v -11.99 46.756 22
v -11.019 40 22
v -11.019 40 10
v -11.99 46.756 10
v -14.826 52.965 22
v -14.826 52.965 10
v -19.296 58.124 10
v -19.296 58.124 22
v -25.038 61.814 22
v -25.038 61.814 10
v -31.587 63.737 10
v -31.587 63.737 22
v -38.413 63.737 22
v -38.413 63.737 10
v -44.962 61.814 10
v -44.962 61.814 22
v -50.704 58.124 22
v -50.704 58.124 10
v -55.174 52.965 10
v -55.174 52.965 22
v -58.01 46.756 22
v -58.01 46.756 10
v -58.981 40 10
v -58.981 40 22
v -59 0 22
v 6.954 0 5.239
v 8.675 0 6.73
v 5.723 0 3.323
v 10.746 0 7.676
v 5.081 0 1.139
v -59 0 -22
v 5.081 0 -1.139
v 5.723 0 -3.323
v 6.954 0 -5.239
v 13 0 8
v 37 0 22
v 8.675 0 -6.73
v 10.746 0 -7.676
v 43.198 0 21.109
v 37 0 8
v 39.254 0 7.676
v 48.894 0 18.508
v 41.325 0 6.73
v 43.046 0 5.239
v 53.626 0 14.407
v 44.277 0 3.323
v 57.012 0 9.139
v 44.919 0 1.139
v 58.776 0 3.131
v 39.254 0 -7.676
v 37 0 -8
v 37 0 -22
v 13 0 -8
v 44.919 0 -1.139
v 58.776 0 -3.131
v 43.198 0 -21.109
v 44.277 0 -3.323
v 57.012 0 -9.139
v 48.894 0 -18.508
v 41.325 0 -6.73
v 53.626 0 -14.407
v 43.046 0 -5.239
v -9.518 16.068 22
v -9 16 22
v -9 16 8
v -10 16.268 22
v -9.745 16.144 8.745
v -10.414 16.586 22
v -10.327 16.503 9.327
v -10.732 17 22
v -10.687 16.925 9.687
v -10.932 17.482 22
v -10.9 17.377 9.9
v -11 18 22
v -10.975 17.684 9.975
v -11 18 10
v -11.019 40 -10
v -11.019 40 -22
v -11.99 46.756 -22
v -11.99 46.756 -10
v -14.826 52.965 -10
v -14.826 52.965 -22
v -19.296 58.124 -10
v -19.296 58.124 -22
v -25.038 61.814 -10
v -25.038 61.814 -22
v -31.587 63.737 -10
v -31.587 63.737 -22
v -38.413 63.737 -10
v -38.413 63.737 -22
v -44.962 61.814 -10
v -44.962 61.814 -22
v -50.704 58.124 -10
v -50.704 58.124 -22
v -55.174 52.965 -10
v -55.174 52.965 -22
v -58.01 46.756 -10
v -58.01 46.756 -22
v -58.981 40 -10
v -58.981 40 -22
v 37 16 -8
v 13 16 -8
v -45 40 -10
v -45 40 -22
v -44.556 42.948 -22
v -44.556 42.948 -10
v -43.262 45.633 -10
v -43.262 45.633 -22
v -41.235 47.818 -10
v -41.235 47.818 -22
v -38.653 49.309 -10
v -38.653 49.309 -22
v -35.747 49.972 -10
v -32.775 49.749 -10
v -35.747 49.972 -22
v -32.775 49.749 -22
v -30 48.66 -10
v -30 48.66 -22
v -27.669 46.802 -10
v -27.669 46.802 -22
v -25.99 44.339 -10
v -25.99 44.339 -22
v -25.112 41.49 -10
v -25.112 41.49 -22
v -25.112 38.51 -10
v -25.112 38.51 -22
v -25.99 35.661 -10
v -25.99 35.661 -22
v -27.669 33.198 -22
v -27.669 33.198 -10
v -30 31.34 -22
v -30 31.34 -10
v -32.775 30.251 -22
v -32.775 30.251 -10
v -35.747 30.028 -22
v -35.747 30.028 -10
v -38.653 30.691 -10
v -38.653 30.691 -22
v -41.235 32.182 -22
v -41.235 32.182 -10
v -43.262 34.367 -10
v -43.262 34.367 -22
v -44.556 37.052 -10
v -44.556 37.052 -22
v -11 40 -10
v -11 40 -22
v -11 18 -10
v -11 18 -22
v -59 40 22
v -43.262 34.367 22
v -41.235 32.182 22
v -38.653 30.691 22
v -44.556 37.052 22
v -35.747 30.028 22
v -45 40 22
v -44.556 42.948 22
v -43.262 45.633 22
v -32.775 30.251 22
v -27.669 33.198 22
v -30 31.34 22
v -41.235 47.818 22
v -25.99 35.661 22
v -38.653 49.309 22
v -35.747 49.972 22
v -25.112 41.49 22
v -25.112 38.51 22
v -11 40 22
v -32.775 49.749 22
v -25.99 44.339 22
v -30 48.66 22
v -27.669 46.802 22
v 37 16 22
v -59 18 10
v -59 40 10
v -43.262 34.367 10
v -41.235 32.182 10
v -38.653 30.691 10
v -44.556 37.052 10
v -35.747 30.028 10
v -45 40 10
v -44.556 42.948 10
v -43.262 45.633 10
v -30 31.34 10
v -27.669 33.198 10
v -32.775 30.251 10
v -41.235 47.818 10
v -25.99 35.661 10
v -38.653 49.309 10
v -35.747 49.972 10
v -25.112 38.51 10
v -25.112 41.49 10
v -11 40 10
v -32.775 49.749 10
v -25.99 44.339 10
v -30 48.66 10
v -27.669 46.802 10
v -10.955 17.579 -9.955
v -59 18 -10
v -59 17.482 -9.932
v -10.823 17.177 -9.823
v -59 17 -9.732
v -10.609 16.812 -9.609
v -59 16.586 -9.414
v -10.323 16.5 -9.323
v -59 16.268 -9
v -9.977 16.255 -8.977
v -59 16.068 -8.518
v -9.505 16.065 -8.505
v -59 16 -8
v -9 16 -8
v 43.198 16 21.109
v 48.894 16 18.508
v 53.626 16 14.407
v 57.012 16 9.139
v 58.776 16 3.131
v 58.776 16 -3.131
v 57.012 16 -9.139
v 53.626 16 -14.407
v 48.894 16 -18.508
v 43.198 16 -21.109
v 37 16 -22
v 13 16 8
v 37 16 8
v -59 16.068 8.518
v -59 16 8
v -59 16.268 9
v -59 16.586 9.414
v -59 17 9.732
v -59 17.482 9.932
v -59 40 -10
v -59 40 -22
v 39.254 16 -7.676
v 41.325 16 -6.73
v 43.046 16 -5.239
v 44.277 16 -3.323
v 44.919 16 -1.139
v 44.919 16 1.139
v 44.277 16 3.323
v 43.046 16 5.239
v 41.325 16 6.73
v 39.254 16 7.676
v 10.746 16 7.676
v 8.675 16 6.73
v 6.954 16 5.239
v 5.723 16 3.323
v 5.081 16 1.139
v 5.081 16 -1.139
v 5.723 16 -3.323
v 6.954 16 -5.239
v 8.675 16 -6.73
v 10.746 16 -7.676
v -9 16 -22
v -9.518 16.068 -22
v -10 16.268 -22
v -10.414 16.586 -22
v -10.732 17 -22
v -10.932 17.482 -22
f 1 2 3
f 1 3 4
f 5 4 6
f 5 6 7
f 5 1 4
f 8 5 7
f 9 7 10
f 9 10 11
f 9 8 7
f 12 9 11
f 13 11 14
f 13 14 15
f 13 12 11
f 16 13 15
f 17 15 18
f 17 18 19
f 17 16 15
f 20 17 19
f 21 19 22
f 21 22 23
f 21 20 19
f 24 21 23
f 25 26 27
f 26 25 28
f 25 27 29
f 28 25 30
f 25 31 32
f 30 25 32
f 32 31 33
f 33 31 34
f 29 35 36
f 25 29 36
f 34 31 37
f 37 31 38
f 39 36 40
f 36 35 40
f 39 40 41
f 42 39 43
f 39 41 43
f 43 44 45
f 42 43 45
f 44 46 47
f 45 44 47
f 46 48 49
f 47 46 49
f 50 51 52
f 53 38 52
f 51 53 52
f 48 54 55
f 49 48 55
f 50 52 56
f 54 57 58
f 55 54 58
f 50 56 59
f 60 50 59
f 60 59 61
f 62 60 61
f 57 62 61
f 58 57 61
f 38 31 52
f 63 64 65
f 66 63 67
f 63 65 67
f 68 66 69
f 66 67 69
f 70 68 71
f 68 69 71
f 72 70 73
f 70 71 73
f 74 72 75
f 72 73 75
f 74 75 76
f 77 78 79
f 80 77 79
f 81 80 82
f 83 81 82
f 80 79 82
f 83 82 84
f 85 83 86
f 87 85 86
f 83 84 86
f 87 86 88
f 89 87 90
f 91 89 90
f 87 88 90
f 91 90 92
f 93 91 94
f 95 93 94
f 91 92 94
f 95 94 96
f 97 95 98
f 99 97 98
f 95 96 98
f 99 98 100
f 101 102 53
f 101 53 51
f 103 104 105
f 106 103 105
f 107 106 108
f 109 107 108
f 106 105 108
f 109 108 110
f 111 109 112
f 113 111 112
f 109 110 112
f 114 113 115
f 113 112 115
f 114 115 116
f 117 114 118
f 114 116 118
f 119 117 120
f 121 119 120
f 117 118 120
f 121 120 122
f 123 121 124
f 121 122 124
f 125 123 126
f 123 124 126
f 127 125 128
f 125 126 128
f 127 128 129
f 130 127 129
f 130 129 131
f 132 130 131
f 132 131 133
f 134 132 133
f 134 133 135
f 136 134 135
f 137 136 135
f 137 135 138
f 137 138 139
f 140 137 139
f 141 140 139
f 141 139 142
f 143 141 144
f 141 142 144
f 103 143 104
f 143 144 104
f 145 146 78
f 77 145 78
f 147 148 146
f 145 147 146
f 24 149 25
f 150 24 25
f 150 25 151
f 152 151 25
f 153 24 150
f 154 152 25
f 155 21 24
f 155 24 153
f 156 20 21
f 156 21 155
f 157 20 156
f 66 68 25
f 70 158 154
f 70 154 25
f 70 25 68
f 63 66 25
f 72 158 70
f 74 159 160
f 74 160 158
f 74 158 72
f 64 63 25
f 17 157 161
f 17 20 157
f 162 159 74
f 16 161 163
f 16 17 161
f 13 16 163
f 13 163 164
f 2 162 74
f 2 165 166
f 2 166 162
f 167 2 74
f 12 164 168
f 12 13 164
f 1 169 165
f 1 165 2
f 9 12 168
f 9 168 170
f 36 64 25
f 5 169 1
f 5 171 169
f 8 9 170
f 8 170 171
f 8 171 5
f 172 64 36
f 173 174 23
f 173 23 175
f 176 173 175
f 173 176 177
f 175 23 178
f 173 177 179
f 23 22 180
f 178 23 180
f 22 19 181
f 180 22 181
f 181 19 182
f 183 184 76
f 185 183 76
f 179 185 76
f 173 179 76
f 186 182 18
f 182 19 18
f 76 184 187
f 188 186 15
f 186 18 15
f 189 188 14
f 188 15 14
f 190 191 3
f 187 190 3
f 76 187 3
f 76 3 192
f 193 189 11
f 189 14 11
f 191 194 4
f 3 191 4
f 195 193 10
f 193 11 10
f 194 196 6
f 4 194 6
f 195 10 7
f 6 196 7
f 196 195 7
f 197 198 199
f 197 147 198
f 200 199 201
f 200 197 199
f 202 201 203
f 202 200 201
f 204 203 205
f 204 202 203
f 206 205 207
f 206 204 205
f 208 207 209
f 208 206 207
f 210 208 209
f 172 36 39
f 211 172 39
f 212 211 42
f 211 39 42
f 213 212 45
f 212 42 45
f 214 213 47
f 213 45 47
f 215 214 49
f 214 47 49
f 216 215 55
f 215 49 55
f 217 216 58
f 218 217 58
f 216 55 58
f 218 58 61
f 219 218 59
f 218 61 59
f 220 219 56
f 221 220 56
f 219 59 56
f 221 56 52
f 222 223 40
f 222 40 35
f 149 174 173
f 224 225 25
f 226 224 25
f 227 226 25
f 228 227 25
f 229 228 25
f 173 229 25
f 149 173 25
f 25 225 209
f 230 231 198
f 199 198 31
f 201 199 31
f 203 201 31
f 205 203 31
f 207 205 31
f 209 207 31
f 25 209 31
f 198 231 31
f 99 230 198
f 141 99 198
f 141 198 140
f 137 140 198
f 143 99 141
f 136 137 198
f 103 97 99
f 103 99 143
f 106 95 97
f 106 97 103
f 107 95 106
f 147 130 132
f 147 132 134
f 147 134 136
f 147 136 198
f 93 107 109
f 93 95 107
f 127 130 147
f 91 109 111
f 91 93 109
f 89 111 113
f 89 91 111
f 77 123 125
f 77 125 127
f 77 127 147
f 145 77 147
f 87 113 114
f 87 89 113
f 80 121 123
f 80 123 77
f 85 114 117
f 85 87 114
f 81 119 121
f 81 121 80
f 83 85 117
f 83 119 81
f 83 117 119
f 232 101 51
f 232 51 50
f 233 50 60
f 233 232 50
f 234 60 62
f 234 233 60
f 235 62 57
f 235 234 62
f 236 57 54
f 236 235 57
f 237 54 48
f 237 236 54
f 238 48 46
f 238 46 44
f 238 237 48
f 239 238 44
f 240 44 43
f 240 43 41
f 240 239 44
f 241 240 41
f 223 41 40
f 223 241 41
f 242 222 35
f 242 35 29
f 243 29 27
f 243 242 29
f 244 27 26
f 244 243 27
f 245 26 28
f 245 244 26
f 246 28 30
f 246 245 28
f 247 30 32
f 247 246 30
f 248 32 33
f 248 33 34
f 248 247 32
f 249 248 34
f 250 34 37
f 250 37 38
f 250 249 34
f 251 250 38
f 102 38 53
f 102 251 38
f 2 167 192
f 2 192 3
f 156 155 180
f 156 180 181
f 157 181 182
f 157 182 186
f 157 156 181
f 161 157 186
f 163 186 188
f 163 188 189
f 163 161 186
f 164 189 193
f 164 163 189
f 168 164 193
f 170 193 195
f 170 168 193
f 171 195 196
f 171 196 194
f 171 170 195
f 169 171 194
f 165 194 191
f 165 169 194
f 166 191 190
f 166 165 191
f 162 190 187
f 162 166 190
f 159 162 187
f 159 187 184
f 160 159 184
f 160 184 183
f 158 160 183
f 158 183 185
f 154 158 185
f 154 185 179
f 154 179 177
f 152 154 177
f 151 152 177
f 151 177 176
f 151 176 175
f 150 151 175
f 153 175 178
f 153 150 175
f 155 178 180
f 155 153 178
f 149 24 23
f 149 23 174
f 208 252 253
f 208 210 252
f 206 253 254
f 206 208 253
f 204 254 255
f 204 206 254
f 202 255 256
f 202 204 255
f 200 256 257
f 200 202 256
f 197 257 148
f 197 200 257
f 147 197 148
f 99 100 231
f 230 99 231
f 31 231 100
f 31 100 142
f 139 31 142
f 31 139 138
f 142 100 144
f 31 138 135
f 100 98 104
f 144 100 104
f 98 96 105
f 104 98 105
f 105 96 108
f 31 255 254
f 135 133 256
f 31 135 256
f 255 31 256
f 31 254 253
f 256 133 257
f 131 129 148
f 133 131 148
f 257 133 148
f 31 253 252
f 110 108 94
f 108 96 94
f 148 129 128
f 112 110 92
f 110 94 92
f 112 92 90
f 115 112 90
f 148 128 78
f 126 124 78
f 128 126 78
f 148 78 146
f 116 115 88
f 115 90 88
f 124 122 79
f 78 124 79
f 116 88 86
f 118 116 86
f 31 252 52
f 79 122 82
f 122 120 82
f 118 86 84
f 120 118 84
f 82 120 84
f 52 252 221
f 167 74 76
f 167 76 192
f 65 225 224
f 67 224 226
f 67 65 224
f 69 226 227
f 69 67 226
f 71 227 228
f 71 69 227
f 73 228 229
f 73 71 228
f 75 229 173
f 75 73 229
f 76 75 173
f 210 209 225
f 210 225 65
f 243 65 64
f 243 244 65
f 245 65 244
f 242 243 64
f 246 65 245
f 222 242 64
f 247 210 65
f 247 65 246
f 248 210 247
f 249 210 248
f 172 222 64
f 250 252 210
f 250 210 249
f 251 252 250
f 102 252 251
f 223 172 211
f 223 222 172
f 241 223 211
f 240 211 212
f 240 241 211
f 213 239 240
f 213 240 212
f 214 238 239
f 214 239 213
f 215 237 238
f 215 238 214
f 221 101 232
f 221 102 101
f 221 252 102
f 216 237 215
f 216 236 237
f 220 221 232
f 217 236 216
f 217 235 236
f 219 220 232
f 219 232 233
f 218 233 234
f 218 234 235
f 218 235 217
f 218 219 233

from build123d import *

# Parameters (mm, degrees)
SKETCH3_R           = 22
BOSS_EXTRUDE1_DEPTH = 16
CUT_EXTRUDE1_DEPTH  = 16
BOSS_EXTRUDE2_DEPTH = 12
FILLET1_R           = 2


with BuildPart() as part:
    # Sketch3 → Boss-Extrude1 (new body)
    with BuildSketch(Plane(origin=(0, 0, 0), x_dir=(1, 0, 0), z_dir=(0, 1, 0))):
        with BuildLine():
            Line((-59, -22), (37, -22))
            ThreePointArc((37, -22), (15, 0), (37, 22))
            Line((37, 22), (-59, 22))
            Line((-59, 22), (-59, -22))
        make_face()
        with Locations((37, 0)):
            Circle(SKETCH3_R)
    extrude(amount=BOSS_EXTRUDE1_DEPTH)

    # Sketch4 → Cut-Extrude1 (cut)
    with BuildSketch(Plane(origin=(0, 16, 0), x_dir=(1, 0, 0), z_dir=(0, 1, 0))):
        with BuildLine():
            Line((37, -8), (13, -8))
            ThreePointArc((13, -8), (5, 0), (13, 8))
            Line((13, 8), (37, 8))
            ThreePointArc((37, 8), (45, 0), (37, -8))
        make_face()
    extrude(amount=-CUT_EXTRUDE1_DEPTH, mode=Mode.SUBTRACT)

    # Sketch5 → Boss-Extrude2 (add)
    with BuildSketch(Plane.XY.offset(22)):
        with BuildLine():
            Line((-59, 40), (-59, 16))
            Line((-59, 16), (-11, 16))
            Line((-11, 16), (-11, 40))
            Line((-11, 40), (-11.018613653, 40))
            ThreePointArc((-11.018613653, 40), (-35, 16.018613653), (-58.981386347, 40))
            Line((-58.981386347, 40), (-59, 40))
        make_face()
        with BuildLine():
            ThreePointArc((-11.018613653, 40), (-35, 63.981386347), (-58.981386347, 40))
            Line((-58.981386347, 40), (-45, 40))
            ThreePointArc((-45, 40), (-35, 50), (-25, 40))
            Line((-25, 40), (-11.018613653, 40))
        make_face()
        with BuildLine():
            Line((-45, 40), (-58.981386347, 40))
            ThreePointArc((-58.981386347, 40), (-35, 16.018613653), (-11.018613653, 40))
            Line((-11.018613653, 40), (-25, 40))
            ThreePointArc((-25, 40), (-35, 30), (-45, 40))
        make_face()
    boss_extrude2 = extrude(amount=-BOSS_EXTRUDE2_DEPTH)

    # Mirror1: Boss-Extrude2 across plane
    add(boss_extrude2.mirror(Plane.XY))

    # Fillet1
    fillet1_edges = [part.edges().sort_by_distance(p)[0] for p in [
        (-11, 16, 16),
        (-35, 16, 10),
        (-35, 16, -10),
        (-11, 16, -16),
    ]]
    fillet(fillet1_edges, radius=FILLET1_R)


solid = part.part
